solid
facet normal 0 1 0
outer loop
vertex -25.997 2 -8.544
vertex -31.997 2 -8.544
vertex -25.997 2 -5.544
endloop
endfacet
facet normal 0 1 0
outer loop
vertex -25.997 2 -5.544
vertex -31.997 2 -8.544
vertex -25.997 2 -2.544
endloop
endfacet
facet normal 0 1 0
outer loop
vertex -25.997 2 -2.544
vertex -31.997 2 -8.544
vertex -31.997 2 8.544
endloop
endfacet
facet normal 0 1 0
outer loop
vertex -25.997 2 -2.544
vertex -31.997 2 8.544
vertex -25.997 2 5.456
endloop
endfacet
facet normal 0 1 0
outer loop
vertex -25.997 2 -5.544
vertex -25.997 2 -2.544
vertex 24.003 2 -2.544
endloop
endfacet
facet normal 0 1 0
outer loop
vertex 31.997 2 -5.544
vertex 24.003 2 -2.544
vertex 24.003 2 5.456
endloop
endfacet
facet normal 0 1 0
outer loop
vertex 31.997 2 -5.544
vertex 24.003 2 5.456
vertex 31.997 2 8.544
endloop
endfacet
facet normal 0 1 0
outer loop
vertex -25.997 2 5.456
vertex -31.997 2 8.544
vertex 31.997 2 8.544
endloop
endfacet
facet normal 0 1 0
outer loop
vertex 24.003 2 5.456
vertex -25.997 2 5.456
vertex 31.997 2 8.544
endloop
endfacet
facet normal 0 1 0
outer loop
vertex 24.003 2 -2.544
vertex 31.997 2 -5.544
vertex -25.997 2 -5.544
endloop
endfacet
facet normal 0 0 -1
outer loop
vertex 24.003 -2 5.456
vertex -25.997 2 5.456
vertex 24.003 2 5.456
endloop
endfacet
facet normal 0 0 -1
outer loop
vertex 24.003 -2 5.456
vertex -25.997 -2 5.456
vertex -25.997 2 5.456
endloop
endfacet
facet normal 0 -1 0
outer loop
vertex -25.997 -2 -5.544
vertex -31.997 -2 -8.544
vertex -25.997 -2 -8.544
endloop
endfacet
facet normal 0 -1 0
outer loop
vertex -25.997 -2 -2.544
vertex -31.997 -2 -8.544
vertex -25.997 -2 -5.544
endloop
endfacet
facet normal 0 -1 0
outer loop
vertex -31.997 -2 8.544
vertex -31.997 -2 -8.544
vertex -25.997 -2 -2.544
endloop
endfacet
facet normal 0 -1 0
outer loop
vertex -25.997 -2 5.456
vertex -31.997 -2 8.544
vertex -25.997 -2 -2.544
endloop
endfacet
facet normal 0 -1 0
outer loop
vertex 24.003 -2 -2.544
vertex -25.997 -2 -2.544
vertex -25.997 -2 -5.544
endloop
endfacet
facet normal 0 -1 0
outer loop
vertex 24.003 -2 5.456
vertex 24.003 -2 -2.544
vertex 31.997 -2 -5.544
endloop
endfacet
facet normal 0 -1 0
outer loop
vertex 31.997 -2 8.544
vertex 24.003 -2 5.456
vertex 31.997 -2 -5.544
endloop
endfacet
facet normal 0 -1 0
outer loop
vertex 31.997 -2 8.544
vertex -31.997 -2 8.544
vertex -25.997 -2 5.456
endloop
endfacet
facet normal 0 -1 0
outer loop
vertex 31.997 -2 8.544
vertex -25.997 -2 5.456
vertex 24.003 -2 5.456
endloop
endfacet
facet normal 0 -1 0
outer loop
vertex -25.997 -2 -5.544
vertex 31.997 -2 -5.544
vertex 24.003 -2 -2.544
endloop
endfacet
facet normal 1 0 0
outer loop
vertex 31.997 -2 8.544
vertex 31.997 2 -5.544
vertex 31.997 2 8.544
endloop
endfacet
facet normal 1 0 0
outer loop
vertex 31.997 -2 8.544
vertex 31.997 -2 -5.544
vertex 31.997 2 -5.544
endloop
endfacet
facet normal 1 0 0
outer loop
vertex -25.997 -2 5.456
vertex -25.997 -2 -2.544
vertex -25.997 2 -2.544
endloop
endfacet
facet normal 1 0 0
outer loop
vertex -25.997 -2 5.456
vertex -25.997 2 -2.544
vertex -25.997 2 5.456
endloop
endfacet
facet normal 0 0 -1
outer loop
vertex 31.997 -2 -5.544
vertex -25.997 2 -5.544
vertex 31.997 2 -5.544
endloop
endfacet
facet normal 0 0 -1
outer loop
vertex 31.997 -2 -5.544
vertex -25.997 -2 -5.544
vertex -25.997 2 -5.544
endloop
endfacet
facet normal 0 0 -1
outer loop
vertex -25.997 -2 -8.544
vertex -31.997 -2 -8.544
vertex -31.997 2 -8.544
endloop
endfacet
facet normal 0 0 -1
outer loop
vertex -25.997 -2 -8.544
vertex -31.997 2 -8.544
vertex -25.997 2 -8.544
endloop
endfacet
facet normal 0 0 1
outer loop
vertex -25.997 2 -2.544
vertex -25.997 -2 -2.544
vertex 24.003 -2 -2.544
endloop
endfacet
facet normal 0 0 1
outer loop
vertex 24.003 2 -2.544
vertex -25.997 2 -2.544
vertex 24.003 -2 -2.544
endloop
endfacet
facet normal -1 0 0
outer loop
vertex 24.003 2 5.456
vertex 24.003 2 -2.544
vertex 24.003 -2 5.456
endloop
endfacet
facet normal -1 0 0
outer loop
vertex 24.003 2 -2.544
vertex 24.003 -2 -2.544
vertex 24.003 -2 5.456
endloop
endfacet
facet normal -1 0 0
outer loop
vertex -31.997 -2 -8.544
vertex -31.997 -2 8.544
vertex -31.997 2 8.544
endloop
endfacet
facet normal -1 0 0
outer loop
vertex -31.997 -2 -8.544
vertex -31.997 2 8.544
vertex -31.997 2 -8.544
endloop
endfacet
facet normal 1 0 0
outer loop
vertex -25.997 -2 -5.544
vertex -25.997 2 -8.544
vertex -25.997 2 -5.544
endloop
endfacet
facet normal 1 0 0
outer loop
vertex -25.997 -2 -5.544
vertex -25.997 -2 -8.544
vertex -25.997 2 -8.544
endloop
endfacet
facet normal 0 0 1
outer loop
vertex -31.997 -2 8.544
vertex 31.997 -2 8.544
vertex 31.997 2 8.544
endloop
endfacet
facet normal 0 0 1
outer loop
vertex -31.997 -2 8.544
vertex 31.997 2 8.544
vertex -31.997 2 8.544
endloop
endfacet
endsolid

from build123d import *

# Parameters (mm, degrees)
F0_W     = 50
F0_H     = 8
F1_DEPTH = 2


with BuildPart() as f1:
    # F0 (on Front) → F1 (new body, symmetric)
    with BuildSketch(Plane.XZ):
        Polygon((31.9974, -5.5436906666), (31.9974, 8.5436906666), (-31.9974, 8.5436906666), (-31.9974, -8.5436906666), (-25.9974, -8.5436906666), (-25.9974, -5.5436906666), align=None)
        with Locations((-0.9974, 1.4563093334)):
            Rectangle(F0_W, F0_H, mode=Mode.SUBTRACT)
    extrude(amount=F1_DEPTH, both=True)


solid = f1.part
